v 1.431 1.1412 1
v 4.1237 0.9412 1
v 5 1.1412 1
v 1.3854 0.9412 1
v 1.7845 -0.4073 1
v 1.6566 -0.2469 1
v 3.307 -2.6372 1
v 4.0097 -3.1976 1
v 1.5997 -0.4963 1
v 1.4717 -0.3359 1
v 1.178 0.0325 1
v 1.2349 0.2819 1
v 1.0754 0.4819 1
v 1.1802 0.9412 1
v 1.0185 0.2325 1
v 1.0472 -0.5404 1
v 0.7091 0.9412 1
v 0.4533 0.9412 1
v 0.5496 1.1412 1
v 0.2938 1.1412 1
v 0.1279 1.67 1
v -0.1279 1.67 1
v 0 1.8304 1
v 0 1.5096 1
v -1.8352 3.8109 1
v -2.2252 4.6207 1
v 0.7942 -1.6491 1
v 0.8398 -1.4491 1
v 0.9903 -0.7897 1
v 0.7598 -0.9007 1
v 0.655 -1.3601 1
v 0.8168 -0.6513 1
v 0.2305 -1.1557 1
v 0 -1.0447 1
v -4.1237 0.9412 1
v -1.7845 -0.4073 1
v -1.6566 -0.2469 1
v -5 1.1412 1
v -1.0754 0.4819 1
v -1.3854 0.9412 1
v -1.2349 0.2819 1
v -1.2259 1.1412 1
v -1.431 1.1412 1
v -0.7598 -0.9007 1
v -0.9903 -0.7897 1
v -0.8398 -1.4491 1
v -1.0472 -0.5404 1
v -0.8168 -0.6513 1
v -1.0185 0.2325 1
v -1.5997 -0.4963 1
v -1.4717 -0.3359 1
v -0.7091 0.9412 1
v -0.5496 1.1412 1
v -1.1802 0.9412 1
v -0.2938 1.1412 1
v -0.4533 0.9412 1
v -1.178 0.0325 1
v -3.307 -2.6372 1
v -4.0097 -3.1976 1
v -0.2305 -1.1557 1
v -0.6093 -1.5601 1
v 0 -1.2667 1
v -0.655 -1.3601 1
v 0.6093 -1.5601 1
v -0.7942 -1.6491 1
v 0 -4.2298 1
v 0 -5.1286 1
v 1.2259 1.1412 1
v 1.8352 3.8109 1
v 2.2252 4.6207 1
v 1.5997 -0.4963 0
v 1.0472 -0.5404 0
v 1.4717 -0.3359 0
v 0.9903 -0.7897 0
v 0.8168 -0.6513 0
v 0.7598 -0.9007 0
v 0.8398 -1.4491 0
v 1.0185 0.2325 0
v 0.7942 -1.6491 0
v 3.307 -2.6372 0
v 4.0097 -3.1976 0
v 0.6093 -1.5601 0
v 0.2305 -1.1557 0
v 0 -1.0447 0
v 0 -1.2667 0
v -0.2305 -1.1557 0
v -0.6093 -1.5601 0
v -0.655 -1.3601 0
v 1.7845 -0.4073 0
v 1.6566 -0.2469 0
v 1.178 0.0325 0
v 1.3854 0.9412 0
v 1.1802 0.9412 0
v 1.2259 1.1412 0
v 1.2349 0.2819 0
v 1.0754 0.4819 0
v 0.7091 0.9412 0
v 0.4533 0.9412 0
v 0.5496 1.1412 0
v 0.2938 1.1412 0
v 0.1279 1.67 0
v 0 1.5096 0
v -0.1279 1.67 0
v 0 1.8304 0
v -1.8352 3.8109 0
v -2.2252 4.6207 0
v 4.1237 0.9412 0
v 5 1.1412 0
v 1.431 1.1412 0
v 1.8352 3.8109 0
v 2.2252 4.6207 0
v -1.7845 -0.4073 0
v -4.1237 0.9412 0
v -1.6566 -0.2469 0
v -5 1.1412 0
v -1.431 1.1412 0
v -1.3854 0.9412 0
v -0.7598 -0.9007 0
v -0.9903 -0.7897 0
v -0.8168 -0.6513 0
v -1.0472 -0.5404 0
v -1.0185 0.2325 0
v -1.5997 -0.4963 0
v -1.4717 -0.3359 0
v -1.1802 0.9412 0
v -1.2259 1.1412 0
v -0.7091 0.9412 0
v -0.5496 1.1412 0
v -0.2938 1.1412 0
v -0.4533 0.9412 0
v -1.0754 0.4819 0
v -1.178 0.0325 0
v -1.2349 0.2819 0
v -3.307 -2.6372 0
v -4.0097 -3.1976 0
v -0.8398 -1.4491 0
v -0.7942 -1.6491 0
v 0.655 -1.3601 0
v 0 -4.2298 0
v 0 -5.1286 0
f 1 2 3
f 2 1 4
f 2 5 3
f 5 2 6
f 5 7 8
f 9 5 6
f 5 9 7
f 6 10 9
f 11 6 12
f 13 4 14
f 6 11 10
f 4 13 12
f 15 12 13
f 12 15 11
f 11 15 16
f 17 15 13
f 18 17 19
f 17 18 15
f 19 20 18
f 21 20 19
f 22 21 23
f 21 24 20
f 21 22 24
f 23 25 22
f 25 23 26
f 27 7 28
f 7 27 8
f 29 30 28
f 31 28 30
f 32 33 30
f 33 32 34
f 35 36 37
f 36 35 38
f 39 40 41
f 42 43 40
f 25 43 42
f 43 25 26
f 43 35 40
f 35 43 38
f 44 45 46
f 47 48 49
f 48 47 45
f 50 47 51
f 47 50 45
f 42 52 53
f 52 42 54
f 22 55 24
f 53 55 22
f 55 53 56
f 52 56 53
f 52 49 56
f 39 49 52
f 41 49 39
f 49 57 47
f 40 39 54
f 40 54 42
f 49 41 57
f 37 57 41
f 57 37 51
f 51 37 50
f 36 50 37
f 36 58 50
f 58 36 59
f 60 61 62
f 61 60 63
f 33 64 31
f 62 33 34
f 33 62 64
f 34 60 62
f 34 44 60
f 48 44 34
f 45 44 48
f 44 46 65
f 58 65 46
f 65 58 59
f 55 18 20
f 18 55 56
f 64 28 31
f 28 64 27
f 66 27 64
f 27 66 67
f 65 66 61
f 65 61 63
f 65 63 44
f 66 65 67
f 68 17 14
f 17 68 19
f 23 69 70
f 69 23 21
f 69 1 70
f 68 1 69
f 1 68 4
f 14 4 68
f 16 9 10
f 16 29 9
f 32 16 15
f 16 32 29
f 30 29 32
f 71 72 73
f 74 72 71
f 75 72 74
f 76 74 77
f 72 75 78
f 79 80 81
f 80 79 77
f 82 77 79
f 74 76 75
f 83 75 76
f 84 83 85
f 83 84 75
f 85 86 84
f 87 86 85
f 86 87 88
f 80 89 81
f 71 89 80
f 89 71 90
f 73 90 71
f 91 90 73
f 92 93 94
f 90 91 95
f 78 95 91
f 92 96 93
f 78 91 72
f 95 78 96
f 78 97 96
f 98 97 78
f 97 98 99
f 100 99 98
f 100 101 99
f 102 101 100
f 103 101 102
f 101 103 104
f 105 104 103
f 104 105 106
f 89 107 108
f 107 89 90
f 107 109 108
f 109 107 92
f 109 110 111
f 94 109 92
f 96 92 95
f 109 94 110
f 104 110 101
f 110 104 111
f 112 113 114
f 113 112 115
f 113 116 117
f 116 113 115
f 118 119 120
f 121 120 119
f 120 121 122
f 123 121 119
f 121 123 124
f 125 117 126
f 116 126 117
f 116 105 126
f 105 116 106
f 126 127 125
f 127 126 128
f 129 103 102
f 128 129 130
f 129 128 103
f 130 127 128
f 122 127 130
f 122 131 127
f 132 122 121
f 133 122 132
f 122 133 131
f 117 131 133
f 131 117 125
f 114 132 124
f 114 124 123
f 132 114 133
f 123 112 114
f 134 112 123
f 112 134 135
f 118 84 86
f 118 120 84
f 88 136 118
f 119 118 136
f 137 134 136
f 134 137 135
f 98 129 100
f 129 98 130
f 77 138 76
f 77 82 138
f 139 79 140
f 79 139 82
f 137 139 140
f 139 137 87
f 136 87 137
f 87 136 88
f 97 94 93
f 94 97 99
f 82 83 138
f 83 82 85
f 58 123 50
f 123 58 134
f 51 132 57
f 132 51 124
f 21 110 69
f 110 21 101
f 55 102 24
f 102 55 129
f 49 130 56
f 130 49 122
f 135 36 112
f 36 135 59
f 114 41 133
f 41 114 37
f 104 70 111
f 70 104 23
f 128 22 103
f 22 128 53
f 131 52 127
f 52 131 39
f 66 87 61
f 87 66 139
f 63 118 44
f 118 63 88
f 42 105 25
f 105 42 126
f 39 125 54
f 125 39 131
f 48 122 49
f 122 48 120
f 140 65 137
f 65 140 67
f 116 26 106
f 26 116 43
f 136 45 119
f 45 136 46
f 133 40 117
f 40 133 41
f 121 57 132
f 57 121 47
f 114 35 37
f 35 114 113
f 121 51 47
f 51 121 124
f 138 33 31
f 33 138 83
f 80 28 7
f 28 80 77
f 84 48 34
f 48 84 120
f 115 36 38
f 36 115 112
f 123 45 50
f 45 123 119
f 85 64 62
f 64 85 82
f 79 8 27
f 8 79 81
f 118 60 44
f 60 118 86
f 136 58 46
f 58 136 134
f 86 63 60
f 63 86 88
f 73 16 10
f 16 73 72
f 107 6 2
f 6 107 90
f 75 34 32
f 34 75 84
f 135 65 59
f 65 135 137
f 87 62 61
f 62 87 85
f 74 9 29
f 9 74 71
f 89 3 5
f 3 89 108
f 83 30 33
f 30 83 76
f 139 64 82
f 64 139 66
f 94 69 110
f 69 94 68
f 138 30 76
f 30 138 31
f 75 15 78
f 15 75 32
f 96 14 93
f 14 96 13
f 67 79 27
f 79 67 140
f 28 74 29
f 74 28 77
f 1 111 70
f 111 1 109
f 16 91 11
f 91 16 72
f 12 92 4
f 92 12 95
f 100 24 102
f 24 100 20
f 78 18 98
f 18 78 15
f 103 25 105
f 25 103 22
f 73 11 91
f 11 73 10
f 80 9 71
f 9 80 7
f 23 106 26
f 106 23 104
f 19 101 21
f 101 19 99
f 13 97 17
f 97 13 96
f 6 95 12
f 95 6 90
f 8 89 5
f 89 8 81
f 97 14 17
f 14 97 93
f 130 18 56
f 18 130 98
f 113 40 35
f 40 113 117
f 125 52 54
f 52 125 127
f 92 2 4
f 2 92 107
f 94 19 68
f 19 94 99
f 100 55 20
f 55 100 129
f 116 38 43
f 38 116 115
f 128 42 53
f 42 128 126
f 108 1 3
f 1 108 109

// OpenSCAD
//Customizable Star Polygon
//Created by Ari M. Diacou, January 2014
//Shared under Creative Commons License: Attribution-ShareAlike 3.0 Unported (CC BY-SA 3.0) 
//see http://creativecommons.org/licenses/by-sa/3.0/

// preview[view:south, tilt:top diagonal]
//The length of one of the sides of the star
length=10;
//The thickness of one of the sides of the star
thickness=.2;
//The height of one of the sides of the star
height=1;
//Vertices (number of points)
p=7;//[5,7,9,11,13,15,17,19]
//Density
//q=5;

/* HIDDEN */
angle=abs(180/p); echo("angle = ",angle);//internal angle of the points
circle_radius=length/(2*sin(2*angle));echo("circle_radius = ",circle_radius);//circle that the polygon is inscribed in
sagitta=circle_radius-sqrt(circle_radius*circle_radius-.25*length*length);echo("sagitta = ",sagitta); //distance from a vertex to the side of the polygon at the vertex's base
side_length=2*sagitta*sin(angle/2)/cos(angle/2); echo("side_length = ",side_length);//the length of the side of the internal polygon
apothem=.5*side_length*cos(180/p)/sin(180/p); echo("apothem = ",apothem); //distance from the origin to one of the sides in the internal regular polygon

module side(){
	mirror([0,1,0]){
		difference(){
			cube([length,thickness,height]);
			rotate([0,0,angle]) 
				cube([thickness/sin(angle),thickness,height]);
			translate([length,0,0]) 	
				mirror([1,0,0]){
					rotate([0,0,angle]) 
						cube([thickness/sin(angle),thickness,height]);
					}
			}
		}
	}

for(i=[1:p]){
	   rotate([0,0,i*2*angle]) 
			translate([-length/2,apothem,0]) 
				side();
		}

